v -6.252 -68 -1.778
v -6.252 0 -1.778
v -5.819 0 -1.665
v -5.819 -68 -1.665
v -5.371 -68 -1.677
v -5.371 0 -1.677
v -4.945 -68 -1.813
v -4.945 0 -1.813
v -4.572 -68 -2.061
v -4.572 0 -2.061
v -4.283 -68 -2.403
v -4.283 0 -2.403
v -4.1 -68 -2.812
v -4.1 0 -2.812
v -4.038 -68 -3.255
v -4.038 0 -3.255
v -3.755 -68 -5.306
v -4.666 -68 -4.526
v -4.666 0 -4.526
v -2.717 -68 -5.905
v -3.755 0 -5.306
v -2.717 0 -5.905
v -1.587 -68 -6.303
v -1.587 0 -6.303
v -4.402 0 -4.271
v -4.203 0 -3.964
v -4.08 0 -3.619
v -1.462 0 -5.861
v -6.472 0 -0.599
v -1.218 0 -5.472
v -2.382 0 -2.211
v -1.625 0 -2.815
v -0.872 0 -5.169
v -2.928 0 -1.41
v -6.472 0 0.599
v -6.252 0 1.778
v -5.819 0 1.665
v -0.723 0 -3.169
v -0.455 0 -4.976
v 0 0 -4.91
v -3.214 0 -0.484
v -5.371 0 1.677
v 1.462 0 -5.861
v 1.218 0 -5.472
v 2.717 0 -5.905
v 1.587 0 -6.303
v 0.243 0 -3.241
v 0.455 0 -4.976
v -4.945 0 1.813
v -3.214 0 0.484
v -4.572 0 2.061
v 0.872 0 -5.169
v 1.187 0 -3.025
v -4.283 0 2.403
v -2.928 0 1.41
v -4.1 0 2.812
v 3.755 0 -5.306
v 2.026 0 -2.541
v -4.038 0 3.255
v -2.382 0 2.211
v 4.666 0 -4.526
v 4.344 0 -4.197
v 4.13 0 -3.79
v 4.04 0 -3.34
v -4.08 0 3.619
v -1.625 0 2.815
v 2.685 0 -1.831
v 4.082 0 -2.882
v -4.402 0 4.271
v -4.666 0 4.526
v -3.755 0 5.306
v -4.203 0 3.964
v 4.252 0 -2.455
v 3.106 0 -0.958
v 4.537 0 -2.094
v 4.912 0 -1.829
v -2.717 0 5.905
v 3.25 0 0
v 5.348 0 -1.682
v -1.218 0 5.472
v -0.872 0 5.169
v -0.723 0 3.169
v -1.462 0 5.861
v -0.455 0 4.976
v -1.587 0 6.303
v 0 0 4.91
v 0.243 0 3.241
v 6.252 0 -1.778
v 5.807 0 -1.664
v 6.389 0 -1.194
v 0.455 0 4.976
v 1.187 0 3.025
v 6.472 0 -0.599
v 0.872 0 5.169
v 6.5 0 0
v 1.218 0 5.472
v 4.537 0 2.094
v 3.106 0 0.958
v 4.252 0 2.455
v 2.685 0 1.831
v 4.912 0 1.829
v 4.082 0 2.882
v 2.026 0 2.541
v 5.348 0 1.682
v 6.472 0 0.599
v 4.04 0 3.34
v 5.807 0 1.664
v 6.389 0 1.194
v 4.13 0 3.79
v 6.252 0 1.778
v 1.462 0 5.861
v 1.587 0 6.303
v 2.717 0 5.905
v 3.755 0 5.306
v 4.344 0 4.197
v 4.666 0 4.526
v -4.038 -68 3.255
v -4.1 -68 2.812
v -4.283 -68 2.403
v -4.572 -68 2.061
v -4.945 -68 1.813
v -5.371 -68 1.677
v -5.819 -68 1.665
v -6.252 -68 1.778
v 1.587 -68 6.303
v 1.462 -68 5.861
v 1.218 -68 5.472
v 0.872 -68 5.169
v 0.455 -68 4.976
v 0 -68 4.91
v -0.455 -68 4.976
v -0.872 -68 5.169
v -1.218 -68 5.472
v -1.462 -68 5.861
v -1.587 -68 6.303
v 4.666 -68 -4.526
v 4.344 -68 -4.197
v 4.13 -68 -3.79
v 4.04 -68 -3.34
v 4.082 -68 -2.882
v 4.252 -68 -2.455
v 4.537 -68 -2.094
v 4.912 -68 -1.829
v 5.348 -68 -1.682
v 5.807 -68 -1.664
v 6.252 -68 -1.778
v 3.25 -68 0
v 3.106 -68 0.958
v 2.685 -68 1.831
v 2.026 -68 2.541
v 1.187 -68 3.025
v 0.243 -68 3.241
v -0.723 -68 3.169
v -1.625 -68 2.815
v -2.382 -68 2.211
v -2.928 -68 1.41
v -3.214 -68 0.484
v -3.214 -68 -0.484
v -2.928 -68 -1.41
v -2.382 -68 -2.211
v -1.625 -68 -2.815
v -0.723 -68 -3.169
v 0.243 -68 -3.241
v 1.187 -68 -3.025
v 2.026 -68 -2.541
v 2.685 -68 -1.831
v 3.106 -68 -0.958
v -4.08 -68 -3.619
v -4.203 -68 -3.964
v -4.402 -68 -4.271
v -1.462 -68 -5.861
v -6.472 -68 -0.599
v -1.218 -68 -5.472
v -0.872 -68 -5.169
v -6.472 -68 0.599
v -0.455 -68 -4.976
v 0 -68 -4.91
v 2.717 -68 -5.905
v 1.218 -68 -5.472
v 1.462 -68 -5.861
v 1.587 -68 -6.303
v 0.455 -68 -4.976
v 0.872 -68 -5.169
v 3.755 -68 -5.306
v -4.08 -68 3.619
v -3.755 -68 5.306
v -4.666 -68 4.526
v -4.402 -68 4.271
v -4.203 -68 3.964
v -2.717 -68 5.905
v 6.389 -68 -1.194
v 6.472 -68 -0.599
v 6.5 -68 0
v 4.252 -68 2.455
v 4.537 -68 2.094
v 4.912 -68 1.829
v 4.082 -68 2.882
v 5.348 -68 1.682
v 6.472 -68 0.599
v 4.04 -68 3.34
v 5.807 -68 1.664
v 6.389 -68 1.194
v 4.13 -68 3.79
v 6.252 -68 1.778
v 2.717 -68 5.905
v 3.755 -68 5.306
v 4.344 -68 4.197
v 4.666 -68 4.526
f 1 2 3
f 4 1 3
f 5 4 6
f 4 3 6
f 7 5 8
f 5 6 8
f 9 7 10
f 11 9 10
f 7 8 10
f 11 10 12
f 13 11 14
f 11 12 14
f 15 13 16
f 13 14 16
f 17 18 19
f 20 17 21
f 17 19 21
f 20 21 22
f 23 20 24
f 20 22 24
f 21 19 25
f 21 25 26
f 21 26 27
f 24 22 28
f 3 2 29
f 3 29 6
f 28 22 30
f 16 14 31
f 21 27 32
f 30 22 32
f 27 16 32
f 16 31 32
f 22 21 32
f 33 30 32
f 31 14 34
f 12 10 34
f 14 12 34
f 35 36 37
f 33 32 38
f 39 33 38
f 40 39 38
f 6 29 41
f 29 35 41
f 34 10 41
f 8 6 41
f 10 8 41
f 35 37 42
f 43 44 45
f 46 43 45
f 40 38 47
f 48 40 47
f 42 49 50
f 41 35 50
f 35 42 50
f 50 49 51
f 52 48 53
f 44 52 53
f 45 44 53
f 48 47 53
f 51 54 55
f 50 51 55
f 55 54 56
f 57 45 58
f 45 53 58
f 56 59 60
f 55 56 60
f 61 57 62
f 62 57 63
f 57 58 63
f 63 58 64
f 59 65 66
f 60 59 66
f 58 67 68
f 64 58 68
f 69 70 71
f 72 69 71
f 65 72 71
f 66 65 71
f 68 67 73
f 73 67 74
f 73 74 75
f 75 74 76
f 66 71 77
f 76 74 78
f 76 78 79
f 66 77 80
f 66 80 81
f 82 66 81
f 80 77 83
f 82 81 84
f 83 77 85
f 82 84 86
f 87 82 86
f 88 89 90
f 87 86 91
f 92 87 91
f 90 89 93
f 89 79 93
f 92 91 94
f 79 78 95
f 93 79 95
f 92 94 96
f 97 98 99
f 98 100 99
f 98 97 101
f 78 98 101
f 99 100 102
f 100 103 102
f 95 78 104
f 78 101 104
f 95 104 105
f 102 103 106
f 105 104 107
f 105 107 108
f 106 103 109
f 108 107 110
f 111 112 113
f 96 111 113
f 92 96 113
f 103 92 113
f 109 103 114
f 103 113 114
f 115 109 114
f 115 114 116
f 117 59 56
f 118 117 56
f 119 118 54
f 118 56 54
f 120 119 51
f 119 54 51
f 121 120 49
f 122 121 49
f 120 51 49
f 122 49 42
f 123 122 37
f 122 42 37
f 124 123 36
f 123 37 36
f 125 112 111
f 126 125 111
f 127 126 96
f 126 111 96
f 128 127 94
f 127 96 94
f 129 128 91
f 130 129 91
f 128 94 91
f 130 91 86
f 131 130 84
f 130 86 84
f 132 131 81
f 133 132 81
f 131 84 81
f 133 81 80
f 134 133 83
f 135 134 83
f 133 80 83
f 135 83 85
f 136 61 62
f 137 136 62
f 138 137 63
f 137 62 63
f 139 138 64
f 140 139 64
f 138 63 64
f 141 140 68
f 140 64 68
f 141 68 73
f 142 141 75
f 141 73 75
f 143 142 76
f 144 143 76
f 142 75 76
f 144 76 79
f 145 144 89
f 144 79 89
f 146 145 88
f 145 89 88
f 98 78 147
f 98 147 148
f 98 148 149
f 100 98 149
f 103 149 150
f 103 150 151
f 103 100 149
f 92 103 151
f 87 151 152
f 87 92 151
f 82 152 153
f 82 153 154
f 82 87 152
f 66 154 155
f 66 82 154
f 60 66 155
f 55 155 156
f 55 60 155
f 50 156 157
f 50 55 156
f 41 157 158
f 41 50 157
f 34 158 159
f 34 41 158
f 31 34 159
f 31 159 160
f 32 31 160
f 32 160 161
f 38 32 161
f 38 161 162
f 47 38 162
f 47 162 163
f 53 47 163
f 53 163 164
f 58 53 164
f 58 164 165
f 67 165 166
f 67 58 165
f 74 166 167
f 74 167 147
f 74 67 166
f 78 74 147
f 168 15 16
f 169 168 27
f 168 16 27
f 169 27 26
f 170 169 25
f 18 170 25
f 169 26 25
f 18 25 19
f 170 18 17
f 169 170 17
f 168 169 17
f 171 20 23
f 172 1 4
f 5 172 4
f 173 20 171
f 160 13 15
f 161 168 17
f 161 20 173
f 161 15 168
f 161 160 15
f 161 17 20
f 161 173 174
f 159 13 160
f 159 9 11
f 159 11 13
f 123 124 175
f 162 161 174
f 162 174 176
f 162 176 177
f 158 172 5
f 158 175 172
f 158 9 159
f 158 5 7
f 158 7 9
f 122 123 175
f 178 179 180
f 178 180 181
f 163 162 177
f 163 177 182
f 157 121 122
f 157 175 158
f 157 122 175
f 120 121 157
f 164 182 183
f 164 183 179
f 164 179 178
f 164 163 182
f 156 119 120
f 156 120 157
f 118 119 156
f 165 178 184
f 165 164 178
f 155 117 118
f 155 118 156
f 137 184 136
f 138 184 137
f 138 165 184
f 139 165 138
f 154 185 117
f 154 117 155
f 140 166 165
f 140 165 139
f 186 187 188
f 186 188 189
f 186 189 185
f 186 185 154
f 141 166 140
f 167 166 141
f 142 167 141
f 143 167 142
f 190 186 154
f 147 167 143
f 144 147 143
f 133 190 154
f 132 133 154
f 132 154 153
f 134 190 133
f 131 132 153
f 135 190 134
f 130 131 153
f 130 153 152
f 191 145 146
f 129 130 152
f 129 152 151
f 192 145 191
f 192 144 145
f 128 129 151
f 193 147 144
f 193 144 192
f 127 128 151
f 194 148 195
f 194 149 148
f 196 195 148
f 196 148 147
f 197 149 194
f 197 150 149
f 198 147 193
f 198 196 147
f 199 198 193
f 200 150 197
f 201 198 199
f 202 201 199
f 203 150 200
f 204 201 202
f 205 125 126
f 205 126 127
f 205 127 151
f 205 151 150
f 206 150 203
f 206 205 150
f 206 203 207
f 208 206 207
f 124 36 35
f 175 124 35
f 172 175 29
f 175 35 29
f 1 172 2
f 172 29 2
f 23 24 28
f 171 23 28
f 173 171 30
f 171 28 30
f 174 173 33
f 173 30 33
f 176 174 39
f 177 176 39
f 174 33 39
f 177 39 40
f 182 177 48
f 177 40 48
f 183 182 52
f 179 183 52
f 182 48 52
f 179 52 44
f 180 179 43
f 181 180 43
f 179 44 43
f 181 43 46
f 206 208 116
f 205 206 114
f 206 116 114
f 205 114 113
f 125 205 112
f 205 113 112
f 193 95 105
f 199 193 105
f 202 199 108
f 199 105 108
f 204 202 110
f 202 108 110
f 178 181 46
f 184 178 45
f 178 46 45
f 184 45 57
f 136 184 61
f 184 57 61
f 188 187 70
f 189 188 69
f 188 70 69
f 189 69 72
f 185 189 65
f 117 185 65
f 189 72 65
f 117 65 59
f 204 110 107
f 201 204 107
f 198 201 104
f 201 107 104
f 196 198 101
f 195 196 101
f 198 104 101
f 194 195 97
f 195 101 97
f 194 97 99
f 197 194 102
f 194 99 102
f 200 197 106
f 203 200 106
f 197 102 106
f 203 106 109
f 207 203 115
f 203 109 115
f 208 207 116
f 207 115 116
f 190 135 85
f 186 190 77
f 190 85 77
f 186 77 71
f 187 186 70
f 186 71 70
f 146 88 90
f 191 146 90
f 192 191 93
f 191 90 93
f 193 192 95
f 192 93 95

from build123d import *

# Parameters (mm, degrees)
F0_R     = 3.25
F1_DEPTH = 68


with BuildPart() as f1:
    # F0 (on Front) → F1 (new body)
    with BuildSketch(Plane.XZ):
        with BuildLine():
            ThreePointArc((6.252197, -1.777646), (6.437751, -0.897417), (6.5, 0))
            ThreePointArc((6.5, 0), (6.437751, 0.897417), (6.252197, 1.777646))
            ThreePointArc((6.252197, 1.777646), (4.252128, 2.454967), (4.665586, 4.525739))
            ThreePointArc((4.665586, 4.525739), (3.25, 5.629165), (1.586612, 6.303385))
            ThreePointArc((1.586612, 6.303385), (0, 4.909935), (-1.586612, 6.303385))
            ThreePointArc((-1.586612, 6.303385), (-3.25, 5.629165), (-4.665586, 4.525739))
            ThreePointArc((-4.665586, 4.525739), (-4.203284, 3.963666), (-4.037769, 3.254967))
            ThreePointArc((-4.037769, 3.254967), (-4.749818, 1.923974), (-6.252197, 1.777646))
            ThreePointArc((-6.252197, 1.777646), (-6.5, 0), (-6.252197, -1.777646))
            ThreePointArc((-6.252197, -1.777646), (-4.749818, -1.923974), (-4.037769, -3.254967))
            ThreePointArc((-4.037769, -3.254967), (-4.203284, -3.963666), (-4.665586, -4.525739))
            ThreePointArc((-4.665586, -4.525739), (-3.25, -5.629165), (-1.586612, -6.303385))
            ThreePointArc((-1.586612, -6.303385), (0, -4.909935), (1.586612, -6.303385))
            ThreePointArc((1.586612, -6.303385), (3.25, -5.629165), (4.665586, -4.525739))
            ThreePointArc((4.665586, -4.525739), (4.252128, -2.454967), (6.252197, -1.777646))
        make_face()
        Circle(F0_R, mode=Mode.SUBTRACT)
    extrude(amount=F1_DEPTH)


solid = f1.part
